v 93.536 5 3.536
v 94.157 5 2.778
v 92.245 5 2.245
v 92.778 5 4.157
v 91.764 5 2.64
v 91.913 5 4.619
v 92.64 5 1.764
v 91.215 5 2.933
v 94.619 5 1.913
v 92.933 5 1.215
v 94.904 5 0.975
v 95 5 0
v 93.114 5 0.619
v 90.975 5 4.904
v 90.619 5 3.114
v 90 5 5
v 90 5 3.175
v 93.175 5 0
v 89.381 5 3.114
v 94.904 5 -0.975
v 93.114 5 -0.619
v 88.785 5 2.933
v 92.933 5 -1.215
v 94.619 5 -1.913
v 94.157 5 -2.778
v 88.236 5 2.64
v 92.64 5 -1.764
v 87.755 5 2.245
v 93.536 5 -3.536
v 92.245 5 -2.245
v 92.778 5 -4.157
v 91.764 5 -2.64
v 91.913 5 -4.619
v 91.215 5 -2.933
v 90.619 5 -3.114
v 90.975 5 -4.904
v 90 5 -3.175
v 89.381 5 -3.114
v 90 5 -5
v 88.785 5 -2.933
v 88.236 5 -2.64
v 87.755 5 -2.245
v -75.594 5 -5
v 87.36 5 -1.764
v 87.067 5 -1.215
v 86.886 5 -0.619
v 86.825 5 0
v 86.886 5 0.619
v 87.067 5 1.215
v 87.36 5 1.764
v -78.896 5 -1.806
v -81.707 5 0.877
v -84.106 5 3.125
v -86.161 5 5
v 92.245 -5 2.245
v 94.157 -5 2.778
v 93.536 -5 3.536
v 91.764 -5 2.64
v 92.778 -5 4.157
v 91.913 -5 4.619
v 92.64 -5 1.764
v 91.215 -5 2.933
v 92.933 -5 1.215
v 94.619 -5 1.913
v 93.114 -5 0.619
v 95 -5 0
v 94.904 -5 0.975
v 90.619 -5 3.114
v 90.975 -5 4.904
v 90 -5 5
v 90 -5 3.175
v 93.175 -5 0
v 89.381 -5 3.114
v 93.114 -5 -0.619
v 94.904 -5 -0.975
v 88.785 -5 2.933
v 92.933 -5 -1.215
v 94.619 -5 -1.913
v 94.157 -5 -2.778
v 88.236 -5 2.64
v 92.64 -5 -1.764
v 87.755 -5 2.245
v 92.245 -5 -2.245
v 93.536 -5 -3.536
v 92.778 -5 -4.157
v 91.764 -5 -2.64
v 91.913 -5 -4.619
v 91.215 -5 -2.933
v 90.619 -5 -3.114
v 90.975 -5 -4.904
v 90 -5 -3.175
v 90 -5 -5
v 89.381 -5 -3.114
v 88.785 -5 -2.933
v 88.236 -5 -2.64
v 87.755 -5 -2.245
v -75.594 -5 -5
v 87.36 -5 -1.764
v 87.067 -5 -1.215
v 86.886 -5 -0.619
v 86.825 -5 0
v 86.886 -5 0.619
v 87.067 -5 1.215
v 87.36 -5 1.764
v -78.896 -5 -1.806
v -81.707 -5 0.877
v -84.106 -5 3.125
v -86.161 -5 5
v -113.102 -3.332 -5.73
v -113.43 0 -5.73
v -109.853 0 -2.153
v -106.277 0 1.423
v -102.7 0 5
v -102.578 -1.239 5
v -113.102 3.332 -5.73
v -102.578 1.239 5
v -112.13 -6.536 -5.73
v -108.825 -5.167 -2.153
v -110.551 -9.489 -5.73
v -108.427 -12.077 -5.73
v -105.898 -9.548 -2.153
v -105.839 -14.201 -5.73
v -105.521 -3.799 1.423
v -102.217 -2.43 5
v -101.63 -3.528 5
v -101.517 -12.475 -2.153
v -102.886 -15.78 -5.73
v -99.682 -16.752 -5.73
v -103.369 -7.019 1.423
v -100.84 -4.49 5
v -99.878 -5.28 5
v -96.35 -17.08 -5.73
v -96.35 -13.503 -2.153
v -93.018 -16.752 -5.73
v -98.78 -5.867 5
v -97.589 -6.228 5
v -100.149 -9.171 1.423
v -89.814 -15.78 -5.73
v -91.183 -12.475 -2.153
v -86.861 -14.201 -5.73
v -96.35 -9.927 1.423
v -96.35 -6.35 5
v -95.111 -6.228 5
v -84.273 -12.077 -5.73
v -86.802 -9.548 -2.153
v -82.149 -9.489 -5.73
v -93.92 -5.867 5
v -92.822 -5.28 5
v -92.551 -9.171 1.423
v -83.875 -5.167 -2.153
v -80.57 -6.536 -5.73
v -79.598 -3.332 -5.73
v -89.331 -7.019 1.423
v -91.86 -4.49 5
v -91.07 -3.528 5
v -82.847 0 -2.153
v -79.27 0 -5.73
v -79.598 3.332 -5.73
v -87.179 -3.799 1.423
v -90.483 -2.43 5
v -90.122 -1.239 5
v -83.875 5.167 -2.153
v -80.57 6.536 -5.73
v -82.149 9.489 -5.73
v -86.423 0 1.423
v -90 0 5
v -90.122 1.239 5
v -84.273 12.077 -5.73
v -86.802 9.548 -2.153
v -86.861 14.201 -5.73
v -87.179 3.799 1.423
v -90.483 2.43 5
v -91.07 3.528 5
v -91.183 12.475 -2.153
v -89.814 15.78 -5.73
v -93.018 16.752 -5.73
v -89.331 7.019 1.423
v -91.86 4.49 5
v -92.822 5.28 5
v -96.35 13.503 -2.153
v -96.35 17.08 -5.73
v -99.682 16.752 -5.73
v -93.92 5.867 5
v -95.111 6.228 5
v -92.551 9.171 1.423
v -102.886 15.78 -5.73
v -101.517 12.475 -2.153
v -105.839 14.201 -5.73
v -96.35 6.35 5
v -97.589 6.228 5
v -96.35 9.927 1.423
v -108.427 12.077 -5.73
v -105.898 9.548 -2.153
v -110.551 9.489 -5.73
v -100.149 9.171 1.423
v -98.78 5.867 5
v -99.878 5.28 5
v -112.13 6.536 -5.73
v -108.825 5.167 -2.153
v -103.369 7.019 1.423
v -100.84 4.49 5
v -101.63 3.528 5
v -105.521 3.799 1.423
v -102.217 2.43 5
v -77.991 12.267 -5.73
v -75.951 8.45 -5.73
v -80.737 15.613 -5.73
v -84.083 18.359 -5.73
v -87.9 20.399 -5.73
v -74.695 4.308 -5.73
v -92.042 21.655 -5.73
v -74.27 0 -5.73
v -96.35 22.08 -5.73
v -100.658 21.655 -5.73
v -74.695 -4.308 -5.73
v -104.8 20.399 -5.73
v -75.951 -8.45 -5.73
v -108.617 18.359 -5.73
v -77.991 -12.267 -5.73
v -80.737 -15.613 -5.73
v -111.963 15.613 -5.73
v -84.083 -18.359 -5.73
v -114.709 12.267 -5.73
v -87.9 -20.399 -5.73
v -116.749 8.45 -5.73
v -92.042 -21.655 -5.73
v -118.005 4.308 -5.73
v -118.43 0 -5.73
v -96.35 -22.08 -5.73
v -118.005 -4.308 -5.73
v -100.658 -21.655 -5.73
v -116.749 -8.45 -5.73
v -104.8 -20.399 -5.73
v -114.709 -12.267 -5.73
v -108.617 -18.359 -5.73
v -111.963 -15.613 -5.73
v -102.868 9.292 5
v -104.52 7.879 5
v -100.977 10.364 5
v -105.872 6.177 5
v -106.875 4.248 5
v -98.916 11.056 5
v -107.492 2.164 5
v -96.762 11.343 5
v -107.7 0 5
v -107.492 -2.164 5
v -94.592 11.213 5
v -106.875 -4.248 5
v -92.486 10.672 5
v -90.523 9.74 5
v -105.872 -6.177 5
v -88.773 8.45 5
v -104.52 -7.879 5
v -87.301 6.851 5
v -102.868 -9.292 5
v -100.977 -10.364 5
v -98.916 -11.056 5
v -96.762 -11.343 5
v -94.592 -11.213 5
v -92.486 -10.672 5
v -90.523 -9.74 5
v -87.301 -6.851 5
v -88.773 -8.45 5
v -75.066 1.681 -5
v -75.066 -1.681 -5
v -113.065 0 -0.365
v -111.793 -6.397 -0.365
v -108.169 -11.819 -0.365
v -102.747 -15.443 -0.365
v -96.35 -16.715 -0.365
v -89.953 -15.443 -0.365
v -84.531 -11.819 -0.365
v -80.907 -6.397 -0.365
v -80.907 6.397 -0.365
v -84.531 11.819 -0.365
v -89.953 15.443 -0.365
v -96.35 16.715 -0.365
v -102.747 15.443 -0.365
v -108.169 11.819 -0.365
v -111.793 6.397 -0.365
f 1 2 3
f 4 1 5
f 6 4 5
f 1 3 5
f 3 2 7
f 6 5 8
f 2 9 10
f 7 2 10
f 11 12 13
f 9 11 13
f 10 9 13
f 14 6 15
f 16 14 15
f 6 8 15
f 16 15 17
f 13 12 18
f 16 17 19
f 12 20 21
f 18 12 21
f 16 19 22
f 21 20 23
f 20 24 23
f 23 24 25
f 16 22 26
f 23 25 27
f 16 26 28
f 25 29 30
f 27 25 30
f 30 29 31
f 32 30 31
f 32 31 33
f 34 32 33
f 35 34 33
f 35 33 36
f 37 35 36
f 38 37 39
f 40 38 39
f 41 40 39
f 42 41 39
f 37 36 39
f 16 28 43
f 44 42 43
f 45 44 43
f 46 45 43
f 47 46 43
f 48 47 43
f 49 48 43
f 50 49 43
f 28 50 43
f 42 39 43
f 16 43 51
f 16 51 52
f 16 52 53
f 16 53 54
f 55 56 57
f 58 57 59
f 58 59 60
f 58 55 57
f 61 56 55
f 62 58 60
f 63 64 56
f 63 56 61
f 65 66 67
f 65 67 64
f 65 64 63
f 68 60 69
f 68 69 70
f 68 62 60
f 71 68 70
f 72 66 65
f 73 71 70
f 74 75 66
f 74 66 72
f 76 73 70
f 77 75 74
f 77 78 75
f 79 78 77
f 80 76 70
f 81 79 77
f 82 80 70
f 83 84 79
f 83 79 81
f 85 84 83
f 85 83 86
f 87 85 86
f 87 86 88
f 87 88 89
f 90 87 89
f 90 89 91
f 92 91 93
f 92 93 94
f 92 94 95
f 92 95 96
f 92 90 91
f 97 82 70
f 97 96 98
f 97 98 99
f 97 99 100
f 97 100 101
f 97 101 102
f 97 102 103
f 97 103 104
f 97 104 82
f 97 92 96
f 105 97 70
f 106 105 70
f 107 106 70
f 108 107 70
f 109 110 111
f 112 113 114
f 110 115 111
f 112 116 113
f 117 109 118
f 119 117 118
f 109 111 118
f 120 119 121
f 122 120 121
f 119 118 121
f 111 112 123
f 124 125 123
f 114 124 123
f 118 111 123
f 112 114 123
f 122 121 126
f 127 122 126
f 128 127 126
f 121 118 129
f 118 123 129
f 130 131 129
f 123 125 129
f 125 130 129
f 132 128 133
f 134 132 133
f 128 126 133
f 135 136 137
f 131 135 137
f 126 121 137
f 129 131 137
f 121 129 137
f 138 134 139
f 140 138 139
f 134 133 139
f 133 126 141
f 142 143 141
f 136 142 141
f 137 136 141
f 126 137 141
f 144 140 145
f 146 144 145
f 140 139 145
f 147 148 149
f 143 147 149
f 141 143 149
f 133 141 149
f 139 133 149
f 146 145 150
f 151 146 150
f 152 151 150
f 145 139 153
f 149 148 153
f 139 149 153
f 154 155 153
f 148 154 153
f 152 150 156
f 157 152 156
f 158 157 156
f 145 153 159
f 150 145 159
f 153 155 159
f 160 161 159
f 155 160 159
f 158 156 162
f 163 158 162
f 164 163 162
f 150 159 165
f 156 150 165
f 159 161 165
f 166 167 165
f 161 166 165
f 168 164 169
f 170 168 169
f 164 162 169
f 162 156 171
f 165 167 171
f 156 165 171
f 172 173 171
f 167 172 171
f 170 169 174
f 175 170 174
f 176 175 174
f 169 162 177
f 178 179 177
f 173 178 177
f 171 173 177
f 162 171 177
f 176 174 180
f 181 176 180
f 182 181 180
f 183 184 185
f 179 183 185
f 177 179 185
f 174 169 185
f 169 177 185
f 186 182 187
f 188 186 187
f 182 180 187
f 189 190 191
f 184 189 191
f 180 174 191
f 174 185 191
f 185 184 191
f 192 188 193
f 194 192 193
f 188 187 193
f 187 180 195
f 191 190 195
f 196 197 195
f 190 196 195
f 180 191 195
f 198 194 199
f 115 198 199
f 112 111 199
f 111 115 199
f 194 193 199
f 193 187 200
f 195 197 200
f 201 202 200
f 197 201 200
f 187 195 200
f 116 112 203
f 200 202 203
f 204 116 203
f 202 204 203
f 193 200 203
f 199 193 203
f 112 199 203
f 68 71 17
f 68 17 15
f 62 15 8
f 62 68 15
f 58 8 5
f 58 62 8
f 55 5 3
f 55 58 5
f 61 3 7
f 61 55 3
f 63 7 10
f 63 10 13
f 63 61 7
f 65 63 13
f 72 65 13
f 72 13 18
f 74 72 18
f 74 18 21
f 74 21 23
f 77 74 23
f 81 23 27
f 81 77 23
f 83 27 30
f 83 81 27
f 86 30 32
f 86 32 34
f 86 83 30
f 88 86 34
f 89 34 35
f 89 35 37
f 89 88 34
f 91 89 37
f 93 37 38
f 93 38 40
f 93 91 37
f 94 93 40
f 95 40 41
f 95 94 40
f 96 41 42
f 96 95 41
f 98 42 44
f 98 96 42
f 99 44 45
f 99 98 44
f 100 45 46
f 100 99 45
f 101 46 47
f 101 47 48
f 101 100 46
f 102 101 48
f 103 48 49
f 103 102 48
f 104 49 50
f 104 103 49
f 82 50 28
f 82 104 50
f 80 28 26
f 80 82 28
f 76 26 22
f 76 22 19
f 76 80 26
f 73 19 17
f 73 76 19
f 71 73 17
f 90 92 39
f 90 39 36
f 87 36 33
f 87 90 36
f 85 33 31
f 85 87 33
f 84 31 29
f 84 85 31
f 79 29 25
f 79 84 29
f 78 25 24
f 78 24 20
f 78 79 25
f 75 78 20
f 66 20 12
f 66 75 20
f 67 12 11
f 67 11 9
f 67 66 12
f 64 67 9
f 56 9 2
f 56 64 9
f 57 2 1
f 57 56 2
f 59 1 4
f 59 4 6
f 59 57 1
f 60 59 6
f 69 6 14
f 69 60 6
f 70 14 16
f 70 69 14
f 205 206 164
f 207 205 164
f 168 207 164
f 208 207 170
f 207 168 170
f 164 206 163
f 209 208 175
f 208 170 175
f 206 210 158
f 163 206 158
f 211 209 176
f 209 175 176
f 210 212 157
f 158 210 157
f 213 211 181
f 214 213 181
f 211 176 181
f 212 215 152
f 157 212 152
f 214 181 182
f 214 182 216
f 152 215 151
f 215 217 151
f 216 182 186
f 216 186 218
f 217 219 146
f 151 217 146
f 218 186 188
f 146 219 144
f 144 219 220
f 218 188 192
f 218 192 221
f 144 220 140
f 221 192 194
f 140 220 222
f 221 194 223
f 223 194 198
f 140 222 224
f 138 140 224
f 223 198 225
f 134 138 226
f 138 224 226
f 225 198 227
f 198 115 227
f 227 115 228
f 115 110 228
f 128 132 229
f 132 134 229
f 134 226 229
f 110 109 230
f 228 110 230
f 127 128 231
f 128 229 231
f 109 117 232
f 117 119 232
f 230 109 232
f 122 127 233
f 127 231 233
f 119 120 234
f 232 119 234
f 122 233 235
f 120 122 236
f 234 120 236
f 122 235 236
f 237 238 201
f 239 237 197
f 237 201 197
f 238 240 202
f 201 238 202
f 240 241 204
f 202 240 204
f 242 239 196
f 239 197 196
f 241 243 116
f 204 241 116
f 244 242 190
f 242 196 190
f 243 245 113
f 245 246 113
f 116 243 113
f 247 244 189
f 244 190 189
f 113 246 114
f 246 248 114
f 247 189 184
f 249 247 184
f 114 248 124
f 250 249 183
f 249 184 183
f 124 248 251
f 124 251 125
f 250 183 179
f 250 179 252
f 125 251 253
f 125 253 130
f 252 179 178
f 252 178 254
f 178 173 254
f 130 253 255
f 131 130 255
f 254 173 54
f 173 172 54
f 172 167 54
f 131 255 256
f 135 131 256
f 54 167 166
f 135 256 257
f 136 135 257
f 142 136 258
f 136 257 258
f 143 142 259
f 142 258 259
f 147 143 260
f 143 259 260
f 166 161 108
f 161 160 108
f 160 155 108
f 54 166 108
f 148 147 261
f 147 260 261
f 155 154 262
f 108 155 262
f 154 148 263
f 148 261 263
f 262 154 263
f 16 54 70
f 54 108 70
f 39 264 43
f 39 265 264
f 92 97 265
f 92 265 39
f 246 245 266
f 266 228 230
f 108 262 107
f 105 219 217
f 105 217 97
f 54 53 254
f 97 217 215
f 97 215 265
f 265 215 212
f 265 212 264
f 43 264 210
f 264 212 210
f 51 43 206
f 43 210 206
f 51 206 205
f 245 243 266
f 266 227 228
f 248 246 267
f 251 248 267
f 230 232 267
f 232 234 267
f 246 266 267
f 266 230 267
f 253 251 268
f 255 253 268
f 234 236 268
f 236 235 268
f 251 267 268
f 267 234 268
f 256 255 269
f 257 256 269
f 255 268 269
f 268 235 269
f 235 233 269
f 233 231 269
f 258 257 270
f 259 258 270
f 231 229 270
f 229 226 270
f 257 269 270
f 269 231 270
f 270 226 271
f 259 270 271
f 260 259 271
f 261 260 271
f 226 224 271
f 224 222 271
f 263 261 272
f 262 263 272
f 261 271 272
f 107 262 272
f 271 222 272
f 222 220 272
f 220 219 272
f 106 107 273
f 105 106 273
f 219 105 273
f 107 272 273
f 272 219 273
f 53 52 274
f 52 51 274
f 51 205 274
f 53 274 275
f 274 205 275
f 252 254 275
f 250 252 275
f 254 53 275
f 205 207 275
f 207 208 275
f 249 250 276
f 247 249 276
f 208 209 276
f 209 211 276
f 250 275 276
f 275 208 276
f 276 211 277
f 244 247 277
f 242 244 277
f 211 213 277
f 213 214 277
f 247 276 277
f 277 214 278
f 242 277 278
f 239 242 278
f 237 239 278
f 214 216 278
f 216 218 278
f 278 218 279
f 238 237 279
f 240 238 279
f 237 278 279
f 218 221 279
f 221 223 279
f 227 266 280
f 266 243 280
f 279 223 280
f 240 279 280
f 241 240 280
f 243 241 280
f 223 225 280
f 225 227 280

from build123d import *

# Parameters (mm, degrees)
BOSS_EXTRUDE2_DEPTH      = 5
BOSS_EXTRUDE2_DEPTH_BACK = 5
SKETCH1_R                = 3.175


with BuildPart() as part:
    # Sketch1 → Boss-Extrude2 (new, two sides: drawn at the far end of the back side and taken through both)
    with BuildSketch(Plane(origin=(0, 0, 0), x_dir=(1, 0, 0), z_dir=(0, 1, 0)).offset(-BOSS_EXTRUDE2_DEPTH_BACK)):
        with BuildLine():
            Line((-90, -5), (90, -5))
            ThreePointArc((90, -5), (95, 0), (90, 5))
            Line((90, 5), (-90, 5))
            Line((-90, 5), (-90, -5))
        make_face()
        with Locations((90, 0)):
            Circle(SKETCH1_R, mode=Mode.SUBTRACT)
    extrude(amount=BOSS_EXTRUDE2_DEPTH + BOSS_EXTRUDE2_DEPTH_BACK)

    # Sketch8 → Revolve3 (revolve)
    with BuildSketch(Plane(origin=(0, 0, 0), x_dir=(1, 0, 0), z_dir=(0, 1, 0))):
        Polygon((-85, -5), (-74.270246445, 5.729753555), (-79.270246445, 5.729753555), (-90, -5), align=None)
    revolve(axis=Axis((-96.35, 0, -14.166845382), (0, 0, 1)))

    # Sketch10 → Cut-Revolve3 (revolve, cut)
    with BuildSketch(Plane(origin=(0, 0, 0), x_dir=(1, 0, 0), z_dir=(0, 1, 0))):
        Polygon((-96.35, 5.729753555), (-79.270246445, 5.729753555), (-90, -5), (-96.35, -5), align=None)
    revolve(axis=Axis((-96.35, 0, -5.729753555), (0, 0, 1)), mode=Mode.SUBTRACT)


solid = part.part
